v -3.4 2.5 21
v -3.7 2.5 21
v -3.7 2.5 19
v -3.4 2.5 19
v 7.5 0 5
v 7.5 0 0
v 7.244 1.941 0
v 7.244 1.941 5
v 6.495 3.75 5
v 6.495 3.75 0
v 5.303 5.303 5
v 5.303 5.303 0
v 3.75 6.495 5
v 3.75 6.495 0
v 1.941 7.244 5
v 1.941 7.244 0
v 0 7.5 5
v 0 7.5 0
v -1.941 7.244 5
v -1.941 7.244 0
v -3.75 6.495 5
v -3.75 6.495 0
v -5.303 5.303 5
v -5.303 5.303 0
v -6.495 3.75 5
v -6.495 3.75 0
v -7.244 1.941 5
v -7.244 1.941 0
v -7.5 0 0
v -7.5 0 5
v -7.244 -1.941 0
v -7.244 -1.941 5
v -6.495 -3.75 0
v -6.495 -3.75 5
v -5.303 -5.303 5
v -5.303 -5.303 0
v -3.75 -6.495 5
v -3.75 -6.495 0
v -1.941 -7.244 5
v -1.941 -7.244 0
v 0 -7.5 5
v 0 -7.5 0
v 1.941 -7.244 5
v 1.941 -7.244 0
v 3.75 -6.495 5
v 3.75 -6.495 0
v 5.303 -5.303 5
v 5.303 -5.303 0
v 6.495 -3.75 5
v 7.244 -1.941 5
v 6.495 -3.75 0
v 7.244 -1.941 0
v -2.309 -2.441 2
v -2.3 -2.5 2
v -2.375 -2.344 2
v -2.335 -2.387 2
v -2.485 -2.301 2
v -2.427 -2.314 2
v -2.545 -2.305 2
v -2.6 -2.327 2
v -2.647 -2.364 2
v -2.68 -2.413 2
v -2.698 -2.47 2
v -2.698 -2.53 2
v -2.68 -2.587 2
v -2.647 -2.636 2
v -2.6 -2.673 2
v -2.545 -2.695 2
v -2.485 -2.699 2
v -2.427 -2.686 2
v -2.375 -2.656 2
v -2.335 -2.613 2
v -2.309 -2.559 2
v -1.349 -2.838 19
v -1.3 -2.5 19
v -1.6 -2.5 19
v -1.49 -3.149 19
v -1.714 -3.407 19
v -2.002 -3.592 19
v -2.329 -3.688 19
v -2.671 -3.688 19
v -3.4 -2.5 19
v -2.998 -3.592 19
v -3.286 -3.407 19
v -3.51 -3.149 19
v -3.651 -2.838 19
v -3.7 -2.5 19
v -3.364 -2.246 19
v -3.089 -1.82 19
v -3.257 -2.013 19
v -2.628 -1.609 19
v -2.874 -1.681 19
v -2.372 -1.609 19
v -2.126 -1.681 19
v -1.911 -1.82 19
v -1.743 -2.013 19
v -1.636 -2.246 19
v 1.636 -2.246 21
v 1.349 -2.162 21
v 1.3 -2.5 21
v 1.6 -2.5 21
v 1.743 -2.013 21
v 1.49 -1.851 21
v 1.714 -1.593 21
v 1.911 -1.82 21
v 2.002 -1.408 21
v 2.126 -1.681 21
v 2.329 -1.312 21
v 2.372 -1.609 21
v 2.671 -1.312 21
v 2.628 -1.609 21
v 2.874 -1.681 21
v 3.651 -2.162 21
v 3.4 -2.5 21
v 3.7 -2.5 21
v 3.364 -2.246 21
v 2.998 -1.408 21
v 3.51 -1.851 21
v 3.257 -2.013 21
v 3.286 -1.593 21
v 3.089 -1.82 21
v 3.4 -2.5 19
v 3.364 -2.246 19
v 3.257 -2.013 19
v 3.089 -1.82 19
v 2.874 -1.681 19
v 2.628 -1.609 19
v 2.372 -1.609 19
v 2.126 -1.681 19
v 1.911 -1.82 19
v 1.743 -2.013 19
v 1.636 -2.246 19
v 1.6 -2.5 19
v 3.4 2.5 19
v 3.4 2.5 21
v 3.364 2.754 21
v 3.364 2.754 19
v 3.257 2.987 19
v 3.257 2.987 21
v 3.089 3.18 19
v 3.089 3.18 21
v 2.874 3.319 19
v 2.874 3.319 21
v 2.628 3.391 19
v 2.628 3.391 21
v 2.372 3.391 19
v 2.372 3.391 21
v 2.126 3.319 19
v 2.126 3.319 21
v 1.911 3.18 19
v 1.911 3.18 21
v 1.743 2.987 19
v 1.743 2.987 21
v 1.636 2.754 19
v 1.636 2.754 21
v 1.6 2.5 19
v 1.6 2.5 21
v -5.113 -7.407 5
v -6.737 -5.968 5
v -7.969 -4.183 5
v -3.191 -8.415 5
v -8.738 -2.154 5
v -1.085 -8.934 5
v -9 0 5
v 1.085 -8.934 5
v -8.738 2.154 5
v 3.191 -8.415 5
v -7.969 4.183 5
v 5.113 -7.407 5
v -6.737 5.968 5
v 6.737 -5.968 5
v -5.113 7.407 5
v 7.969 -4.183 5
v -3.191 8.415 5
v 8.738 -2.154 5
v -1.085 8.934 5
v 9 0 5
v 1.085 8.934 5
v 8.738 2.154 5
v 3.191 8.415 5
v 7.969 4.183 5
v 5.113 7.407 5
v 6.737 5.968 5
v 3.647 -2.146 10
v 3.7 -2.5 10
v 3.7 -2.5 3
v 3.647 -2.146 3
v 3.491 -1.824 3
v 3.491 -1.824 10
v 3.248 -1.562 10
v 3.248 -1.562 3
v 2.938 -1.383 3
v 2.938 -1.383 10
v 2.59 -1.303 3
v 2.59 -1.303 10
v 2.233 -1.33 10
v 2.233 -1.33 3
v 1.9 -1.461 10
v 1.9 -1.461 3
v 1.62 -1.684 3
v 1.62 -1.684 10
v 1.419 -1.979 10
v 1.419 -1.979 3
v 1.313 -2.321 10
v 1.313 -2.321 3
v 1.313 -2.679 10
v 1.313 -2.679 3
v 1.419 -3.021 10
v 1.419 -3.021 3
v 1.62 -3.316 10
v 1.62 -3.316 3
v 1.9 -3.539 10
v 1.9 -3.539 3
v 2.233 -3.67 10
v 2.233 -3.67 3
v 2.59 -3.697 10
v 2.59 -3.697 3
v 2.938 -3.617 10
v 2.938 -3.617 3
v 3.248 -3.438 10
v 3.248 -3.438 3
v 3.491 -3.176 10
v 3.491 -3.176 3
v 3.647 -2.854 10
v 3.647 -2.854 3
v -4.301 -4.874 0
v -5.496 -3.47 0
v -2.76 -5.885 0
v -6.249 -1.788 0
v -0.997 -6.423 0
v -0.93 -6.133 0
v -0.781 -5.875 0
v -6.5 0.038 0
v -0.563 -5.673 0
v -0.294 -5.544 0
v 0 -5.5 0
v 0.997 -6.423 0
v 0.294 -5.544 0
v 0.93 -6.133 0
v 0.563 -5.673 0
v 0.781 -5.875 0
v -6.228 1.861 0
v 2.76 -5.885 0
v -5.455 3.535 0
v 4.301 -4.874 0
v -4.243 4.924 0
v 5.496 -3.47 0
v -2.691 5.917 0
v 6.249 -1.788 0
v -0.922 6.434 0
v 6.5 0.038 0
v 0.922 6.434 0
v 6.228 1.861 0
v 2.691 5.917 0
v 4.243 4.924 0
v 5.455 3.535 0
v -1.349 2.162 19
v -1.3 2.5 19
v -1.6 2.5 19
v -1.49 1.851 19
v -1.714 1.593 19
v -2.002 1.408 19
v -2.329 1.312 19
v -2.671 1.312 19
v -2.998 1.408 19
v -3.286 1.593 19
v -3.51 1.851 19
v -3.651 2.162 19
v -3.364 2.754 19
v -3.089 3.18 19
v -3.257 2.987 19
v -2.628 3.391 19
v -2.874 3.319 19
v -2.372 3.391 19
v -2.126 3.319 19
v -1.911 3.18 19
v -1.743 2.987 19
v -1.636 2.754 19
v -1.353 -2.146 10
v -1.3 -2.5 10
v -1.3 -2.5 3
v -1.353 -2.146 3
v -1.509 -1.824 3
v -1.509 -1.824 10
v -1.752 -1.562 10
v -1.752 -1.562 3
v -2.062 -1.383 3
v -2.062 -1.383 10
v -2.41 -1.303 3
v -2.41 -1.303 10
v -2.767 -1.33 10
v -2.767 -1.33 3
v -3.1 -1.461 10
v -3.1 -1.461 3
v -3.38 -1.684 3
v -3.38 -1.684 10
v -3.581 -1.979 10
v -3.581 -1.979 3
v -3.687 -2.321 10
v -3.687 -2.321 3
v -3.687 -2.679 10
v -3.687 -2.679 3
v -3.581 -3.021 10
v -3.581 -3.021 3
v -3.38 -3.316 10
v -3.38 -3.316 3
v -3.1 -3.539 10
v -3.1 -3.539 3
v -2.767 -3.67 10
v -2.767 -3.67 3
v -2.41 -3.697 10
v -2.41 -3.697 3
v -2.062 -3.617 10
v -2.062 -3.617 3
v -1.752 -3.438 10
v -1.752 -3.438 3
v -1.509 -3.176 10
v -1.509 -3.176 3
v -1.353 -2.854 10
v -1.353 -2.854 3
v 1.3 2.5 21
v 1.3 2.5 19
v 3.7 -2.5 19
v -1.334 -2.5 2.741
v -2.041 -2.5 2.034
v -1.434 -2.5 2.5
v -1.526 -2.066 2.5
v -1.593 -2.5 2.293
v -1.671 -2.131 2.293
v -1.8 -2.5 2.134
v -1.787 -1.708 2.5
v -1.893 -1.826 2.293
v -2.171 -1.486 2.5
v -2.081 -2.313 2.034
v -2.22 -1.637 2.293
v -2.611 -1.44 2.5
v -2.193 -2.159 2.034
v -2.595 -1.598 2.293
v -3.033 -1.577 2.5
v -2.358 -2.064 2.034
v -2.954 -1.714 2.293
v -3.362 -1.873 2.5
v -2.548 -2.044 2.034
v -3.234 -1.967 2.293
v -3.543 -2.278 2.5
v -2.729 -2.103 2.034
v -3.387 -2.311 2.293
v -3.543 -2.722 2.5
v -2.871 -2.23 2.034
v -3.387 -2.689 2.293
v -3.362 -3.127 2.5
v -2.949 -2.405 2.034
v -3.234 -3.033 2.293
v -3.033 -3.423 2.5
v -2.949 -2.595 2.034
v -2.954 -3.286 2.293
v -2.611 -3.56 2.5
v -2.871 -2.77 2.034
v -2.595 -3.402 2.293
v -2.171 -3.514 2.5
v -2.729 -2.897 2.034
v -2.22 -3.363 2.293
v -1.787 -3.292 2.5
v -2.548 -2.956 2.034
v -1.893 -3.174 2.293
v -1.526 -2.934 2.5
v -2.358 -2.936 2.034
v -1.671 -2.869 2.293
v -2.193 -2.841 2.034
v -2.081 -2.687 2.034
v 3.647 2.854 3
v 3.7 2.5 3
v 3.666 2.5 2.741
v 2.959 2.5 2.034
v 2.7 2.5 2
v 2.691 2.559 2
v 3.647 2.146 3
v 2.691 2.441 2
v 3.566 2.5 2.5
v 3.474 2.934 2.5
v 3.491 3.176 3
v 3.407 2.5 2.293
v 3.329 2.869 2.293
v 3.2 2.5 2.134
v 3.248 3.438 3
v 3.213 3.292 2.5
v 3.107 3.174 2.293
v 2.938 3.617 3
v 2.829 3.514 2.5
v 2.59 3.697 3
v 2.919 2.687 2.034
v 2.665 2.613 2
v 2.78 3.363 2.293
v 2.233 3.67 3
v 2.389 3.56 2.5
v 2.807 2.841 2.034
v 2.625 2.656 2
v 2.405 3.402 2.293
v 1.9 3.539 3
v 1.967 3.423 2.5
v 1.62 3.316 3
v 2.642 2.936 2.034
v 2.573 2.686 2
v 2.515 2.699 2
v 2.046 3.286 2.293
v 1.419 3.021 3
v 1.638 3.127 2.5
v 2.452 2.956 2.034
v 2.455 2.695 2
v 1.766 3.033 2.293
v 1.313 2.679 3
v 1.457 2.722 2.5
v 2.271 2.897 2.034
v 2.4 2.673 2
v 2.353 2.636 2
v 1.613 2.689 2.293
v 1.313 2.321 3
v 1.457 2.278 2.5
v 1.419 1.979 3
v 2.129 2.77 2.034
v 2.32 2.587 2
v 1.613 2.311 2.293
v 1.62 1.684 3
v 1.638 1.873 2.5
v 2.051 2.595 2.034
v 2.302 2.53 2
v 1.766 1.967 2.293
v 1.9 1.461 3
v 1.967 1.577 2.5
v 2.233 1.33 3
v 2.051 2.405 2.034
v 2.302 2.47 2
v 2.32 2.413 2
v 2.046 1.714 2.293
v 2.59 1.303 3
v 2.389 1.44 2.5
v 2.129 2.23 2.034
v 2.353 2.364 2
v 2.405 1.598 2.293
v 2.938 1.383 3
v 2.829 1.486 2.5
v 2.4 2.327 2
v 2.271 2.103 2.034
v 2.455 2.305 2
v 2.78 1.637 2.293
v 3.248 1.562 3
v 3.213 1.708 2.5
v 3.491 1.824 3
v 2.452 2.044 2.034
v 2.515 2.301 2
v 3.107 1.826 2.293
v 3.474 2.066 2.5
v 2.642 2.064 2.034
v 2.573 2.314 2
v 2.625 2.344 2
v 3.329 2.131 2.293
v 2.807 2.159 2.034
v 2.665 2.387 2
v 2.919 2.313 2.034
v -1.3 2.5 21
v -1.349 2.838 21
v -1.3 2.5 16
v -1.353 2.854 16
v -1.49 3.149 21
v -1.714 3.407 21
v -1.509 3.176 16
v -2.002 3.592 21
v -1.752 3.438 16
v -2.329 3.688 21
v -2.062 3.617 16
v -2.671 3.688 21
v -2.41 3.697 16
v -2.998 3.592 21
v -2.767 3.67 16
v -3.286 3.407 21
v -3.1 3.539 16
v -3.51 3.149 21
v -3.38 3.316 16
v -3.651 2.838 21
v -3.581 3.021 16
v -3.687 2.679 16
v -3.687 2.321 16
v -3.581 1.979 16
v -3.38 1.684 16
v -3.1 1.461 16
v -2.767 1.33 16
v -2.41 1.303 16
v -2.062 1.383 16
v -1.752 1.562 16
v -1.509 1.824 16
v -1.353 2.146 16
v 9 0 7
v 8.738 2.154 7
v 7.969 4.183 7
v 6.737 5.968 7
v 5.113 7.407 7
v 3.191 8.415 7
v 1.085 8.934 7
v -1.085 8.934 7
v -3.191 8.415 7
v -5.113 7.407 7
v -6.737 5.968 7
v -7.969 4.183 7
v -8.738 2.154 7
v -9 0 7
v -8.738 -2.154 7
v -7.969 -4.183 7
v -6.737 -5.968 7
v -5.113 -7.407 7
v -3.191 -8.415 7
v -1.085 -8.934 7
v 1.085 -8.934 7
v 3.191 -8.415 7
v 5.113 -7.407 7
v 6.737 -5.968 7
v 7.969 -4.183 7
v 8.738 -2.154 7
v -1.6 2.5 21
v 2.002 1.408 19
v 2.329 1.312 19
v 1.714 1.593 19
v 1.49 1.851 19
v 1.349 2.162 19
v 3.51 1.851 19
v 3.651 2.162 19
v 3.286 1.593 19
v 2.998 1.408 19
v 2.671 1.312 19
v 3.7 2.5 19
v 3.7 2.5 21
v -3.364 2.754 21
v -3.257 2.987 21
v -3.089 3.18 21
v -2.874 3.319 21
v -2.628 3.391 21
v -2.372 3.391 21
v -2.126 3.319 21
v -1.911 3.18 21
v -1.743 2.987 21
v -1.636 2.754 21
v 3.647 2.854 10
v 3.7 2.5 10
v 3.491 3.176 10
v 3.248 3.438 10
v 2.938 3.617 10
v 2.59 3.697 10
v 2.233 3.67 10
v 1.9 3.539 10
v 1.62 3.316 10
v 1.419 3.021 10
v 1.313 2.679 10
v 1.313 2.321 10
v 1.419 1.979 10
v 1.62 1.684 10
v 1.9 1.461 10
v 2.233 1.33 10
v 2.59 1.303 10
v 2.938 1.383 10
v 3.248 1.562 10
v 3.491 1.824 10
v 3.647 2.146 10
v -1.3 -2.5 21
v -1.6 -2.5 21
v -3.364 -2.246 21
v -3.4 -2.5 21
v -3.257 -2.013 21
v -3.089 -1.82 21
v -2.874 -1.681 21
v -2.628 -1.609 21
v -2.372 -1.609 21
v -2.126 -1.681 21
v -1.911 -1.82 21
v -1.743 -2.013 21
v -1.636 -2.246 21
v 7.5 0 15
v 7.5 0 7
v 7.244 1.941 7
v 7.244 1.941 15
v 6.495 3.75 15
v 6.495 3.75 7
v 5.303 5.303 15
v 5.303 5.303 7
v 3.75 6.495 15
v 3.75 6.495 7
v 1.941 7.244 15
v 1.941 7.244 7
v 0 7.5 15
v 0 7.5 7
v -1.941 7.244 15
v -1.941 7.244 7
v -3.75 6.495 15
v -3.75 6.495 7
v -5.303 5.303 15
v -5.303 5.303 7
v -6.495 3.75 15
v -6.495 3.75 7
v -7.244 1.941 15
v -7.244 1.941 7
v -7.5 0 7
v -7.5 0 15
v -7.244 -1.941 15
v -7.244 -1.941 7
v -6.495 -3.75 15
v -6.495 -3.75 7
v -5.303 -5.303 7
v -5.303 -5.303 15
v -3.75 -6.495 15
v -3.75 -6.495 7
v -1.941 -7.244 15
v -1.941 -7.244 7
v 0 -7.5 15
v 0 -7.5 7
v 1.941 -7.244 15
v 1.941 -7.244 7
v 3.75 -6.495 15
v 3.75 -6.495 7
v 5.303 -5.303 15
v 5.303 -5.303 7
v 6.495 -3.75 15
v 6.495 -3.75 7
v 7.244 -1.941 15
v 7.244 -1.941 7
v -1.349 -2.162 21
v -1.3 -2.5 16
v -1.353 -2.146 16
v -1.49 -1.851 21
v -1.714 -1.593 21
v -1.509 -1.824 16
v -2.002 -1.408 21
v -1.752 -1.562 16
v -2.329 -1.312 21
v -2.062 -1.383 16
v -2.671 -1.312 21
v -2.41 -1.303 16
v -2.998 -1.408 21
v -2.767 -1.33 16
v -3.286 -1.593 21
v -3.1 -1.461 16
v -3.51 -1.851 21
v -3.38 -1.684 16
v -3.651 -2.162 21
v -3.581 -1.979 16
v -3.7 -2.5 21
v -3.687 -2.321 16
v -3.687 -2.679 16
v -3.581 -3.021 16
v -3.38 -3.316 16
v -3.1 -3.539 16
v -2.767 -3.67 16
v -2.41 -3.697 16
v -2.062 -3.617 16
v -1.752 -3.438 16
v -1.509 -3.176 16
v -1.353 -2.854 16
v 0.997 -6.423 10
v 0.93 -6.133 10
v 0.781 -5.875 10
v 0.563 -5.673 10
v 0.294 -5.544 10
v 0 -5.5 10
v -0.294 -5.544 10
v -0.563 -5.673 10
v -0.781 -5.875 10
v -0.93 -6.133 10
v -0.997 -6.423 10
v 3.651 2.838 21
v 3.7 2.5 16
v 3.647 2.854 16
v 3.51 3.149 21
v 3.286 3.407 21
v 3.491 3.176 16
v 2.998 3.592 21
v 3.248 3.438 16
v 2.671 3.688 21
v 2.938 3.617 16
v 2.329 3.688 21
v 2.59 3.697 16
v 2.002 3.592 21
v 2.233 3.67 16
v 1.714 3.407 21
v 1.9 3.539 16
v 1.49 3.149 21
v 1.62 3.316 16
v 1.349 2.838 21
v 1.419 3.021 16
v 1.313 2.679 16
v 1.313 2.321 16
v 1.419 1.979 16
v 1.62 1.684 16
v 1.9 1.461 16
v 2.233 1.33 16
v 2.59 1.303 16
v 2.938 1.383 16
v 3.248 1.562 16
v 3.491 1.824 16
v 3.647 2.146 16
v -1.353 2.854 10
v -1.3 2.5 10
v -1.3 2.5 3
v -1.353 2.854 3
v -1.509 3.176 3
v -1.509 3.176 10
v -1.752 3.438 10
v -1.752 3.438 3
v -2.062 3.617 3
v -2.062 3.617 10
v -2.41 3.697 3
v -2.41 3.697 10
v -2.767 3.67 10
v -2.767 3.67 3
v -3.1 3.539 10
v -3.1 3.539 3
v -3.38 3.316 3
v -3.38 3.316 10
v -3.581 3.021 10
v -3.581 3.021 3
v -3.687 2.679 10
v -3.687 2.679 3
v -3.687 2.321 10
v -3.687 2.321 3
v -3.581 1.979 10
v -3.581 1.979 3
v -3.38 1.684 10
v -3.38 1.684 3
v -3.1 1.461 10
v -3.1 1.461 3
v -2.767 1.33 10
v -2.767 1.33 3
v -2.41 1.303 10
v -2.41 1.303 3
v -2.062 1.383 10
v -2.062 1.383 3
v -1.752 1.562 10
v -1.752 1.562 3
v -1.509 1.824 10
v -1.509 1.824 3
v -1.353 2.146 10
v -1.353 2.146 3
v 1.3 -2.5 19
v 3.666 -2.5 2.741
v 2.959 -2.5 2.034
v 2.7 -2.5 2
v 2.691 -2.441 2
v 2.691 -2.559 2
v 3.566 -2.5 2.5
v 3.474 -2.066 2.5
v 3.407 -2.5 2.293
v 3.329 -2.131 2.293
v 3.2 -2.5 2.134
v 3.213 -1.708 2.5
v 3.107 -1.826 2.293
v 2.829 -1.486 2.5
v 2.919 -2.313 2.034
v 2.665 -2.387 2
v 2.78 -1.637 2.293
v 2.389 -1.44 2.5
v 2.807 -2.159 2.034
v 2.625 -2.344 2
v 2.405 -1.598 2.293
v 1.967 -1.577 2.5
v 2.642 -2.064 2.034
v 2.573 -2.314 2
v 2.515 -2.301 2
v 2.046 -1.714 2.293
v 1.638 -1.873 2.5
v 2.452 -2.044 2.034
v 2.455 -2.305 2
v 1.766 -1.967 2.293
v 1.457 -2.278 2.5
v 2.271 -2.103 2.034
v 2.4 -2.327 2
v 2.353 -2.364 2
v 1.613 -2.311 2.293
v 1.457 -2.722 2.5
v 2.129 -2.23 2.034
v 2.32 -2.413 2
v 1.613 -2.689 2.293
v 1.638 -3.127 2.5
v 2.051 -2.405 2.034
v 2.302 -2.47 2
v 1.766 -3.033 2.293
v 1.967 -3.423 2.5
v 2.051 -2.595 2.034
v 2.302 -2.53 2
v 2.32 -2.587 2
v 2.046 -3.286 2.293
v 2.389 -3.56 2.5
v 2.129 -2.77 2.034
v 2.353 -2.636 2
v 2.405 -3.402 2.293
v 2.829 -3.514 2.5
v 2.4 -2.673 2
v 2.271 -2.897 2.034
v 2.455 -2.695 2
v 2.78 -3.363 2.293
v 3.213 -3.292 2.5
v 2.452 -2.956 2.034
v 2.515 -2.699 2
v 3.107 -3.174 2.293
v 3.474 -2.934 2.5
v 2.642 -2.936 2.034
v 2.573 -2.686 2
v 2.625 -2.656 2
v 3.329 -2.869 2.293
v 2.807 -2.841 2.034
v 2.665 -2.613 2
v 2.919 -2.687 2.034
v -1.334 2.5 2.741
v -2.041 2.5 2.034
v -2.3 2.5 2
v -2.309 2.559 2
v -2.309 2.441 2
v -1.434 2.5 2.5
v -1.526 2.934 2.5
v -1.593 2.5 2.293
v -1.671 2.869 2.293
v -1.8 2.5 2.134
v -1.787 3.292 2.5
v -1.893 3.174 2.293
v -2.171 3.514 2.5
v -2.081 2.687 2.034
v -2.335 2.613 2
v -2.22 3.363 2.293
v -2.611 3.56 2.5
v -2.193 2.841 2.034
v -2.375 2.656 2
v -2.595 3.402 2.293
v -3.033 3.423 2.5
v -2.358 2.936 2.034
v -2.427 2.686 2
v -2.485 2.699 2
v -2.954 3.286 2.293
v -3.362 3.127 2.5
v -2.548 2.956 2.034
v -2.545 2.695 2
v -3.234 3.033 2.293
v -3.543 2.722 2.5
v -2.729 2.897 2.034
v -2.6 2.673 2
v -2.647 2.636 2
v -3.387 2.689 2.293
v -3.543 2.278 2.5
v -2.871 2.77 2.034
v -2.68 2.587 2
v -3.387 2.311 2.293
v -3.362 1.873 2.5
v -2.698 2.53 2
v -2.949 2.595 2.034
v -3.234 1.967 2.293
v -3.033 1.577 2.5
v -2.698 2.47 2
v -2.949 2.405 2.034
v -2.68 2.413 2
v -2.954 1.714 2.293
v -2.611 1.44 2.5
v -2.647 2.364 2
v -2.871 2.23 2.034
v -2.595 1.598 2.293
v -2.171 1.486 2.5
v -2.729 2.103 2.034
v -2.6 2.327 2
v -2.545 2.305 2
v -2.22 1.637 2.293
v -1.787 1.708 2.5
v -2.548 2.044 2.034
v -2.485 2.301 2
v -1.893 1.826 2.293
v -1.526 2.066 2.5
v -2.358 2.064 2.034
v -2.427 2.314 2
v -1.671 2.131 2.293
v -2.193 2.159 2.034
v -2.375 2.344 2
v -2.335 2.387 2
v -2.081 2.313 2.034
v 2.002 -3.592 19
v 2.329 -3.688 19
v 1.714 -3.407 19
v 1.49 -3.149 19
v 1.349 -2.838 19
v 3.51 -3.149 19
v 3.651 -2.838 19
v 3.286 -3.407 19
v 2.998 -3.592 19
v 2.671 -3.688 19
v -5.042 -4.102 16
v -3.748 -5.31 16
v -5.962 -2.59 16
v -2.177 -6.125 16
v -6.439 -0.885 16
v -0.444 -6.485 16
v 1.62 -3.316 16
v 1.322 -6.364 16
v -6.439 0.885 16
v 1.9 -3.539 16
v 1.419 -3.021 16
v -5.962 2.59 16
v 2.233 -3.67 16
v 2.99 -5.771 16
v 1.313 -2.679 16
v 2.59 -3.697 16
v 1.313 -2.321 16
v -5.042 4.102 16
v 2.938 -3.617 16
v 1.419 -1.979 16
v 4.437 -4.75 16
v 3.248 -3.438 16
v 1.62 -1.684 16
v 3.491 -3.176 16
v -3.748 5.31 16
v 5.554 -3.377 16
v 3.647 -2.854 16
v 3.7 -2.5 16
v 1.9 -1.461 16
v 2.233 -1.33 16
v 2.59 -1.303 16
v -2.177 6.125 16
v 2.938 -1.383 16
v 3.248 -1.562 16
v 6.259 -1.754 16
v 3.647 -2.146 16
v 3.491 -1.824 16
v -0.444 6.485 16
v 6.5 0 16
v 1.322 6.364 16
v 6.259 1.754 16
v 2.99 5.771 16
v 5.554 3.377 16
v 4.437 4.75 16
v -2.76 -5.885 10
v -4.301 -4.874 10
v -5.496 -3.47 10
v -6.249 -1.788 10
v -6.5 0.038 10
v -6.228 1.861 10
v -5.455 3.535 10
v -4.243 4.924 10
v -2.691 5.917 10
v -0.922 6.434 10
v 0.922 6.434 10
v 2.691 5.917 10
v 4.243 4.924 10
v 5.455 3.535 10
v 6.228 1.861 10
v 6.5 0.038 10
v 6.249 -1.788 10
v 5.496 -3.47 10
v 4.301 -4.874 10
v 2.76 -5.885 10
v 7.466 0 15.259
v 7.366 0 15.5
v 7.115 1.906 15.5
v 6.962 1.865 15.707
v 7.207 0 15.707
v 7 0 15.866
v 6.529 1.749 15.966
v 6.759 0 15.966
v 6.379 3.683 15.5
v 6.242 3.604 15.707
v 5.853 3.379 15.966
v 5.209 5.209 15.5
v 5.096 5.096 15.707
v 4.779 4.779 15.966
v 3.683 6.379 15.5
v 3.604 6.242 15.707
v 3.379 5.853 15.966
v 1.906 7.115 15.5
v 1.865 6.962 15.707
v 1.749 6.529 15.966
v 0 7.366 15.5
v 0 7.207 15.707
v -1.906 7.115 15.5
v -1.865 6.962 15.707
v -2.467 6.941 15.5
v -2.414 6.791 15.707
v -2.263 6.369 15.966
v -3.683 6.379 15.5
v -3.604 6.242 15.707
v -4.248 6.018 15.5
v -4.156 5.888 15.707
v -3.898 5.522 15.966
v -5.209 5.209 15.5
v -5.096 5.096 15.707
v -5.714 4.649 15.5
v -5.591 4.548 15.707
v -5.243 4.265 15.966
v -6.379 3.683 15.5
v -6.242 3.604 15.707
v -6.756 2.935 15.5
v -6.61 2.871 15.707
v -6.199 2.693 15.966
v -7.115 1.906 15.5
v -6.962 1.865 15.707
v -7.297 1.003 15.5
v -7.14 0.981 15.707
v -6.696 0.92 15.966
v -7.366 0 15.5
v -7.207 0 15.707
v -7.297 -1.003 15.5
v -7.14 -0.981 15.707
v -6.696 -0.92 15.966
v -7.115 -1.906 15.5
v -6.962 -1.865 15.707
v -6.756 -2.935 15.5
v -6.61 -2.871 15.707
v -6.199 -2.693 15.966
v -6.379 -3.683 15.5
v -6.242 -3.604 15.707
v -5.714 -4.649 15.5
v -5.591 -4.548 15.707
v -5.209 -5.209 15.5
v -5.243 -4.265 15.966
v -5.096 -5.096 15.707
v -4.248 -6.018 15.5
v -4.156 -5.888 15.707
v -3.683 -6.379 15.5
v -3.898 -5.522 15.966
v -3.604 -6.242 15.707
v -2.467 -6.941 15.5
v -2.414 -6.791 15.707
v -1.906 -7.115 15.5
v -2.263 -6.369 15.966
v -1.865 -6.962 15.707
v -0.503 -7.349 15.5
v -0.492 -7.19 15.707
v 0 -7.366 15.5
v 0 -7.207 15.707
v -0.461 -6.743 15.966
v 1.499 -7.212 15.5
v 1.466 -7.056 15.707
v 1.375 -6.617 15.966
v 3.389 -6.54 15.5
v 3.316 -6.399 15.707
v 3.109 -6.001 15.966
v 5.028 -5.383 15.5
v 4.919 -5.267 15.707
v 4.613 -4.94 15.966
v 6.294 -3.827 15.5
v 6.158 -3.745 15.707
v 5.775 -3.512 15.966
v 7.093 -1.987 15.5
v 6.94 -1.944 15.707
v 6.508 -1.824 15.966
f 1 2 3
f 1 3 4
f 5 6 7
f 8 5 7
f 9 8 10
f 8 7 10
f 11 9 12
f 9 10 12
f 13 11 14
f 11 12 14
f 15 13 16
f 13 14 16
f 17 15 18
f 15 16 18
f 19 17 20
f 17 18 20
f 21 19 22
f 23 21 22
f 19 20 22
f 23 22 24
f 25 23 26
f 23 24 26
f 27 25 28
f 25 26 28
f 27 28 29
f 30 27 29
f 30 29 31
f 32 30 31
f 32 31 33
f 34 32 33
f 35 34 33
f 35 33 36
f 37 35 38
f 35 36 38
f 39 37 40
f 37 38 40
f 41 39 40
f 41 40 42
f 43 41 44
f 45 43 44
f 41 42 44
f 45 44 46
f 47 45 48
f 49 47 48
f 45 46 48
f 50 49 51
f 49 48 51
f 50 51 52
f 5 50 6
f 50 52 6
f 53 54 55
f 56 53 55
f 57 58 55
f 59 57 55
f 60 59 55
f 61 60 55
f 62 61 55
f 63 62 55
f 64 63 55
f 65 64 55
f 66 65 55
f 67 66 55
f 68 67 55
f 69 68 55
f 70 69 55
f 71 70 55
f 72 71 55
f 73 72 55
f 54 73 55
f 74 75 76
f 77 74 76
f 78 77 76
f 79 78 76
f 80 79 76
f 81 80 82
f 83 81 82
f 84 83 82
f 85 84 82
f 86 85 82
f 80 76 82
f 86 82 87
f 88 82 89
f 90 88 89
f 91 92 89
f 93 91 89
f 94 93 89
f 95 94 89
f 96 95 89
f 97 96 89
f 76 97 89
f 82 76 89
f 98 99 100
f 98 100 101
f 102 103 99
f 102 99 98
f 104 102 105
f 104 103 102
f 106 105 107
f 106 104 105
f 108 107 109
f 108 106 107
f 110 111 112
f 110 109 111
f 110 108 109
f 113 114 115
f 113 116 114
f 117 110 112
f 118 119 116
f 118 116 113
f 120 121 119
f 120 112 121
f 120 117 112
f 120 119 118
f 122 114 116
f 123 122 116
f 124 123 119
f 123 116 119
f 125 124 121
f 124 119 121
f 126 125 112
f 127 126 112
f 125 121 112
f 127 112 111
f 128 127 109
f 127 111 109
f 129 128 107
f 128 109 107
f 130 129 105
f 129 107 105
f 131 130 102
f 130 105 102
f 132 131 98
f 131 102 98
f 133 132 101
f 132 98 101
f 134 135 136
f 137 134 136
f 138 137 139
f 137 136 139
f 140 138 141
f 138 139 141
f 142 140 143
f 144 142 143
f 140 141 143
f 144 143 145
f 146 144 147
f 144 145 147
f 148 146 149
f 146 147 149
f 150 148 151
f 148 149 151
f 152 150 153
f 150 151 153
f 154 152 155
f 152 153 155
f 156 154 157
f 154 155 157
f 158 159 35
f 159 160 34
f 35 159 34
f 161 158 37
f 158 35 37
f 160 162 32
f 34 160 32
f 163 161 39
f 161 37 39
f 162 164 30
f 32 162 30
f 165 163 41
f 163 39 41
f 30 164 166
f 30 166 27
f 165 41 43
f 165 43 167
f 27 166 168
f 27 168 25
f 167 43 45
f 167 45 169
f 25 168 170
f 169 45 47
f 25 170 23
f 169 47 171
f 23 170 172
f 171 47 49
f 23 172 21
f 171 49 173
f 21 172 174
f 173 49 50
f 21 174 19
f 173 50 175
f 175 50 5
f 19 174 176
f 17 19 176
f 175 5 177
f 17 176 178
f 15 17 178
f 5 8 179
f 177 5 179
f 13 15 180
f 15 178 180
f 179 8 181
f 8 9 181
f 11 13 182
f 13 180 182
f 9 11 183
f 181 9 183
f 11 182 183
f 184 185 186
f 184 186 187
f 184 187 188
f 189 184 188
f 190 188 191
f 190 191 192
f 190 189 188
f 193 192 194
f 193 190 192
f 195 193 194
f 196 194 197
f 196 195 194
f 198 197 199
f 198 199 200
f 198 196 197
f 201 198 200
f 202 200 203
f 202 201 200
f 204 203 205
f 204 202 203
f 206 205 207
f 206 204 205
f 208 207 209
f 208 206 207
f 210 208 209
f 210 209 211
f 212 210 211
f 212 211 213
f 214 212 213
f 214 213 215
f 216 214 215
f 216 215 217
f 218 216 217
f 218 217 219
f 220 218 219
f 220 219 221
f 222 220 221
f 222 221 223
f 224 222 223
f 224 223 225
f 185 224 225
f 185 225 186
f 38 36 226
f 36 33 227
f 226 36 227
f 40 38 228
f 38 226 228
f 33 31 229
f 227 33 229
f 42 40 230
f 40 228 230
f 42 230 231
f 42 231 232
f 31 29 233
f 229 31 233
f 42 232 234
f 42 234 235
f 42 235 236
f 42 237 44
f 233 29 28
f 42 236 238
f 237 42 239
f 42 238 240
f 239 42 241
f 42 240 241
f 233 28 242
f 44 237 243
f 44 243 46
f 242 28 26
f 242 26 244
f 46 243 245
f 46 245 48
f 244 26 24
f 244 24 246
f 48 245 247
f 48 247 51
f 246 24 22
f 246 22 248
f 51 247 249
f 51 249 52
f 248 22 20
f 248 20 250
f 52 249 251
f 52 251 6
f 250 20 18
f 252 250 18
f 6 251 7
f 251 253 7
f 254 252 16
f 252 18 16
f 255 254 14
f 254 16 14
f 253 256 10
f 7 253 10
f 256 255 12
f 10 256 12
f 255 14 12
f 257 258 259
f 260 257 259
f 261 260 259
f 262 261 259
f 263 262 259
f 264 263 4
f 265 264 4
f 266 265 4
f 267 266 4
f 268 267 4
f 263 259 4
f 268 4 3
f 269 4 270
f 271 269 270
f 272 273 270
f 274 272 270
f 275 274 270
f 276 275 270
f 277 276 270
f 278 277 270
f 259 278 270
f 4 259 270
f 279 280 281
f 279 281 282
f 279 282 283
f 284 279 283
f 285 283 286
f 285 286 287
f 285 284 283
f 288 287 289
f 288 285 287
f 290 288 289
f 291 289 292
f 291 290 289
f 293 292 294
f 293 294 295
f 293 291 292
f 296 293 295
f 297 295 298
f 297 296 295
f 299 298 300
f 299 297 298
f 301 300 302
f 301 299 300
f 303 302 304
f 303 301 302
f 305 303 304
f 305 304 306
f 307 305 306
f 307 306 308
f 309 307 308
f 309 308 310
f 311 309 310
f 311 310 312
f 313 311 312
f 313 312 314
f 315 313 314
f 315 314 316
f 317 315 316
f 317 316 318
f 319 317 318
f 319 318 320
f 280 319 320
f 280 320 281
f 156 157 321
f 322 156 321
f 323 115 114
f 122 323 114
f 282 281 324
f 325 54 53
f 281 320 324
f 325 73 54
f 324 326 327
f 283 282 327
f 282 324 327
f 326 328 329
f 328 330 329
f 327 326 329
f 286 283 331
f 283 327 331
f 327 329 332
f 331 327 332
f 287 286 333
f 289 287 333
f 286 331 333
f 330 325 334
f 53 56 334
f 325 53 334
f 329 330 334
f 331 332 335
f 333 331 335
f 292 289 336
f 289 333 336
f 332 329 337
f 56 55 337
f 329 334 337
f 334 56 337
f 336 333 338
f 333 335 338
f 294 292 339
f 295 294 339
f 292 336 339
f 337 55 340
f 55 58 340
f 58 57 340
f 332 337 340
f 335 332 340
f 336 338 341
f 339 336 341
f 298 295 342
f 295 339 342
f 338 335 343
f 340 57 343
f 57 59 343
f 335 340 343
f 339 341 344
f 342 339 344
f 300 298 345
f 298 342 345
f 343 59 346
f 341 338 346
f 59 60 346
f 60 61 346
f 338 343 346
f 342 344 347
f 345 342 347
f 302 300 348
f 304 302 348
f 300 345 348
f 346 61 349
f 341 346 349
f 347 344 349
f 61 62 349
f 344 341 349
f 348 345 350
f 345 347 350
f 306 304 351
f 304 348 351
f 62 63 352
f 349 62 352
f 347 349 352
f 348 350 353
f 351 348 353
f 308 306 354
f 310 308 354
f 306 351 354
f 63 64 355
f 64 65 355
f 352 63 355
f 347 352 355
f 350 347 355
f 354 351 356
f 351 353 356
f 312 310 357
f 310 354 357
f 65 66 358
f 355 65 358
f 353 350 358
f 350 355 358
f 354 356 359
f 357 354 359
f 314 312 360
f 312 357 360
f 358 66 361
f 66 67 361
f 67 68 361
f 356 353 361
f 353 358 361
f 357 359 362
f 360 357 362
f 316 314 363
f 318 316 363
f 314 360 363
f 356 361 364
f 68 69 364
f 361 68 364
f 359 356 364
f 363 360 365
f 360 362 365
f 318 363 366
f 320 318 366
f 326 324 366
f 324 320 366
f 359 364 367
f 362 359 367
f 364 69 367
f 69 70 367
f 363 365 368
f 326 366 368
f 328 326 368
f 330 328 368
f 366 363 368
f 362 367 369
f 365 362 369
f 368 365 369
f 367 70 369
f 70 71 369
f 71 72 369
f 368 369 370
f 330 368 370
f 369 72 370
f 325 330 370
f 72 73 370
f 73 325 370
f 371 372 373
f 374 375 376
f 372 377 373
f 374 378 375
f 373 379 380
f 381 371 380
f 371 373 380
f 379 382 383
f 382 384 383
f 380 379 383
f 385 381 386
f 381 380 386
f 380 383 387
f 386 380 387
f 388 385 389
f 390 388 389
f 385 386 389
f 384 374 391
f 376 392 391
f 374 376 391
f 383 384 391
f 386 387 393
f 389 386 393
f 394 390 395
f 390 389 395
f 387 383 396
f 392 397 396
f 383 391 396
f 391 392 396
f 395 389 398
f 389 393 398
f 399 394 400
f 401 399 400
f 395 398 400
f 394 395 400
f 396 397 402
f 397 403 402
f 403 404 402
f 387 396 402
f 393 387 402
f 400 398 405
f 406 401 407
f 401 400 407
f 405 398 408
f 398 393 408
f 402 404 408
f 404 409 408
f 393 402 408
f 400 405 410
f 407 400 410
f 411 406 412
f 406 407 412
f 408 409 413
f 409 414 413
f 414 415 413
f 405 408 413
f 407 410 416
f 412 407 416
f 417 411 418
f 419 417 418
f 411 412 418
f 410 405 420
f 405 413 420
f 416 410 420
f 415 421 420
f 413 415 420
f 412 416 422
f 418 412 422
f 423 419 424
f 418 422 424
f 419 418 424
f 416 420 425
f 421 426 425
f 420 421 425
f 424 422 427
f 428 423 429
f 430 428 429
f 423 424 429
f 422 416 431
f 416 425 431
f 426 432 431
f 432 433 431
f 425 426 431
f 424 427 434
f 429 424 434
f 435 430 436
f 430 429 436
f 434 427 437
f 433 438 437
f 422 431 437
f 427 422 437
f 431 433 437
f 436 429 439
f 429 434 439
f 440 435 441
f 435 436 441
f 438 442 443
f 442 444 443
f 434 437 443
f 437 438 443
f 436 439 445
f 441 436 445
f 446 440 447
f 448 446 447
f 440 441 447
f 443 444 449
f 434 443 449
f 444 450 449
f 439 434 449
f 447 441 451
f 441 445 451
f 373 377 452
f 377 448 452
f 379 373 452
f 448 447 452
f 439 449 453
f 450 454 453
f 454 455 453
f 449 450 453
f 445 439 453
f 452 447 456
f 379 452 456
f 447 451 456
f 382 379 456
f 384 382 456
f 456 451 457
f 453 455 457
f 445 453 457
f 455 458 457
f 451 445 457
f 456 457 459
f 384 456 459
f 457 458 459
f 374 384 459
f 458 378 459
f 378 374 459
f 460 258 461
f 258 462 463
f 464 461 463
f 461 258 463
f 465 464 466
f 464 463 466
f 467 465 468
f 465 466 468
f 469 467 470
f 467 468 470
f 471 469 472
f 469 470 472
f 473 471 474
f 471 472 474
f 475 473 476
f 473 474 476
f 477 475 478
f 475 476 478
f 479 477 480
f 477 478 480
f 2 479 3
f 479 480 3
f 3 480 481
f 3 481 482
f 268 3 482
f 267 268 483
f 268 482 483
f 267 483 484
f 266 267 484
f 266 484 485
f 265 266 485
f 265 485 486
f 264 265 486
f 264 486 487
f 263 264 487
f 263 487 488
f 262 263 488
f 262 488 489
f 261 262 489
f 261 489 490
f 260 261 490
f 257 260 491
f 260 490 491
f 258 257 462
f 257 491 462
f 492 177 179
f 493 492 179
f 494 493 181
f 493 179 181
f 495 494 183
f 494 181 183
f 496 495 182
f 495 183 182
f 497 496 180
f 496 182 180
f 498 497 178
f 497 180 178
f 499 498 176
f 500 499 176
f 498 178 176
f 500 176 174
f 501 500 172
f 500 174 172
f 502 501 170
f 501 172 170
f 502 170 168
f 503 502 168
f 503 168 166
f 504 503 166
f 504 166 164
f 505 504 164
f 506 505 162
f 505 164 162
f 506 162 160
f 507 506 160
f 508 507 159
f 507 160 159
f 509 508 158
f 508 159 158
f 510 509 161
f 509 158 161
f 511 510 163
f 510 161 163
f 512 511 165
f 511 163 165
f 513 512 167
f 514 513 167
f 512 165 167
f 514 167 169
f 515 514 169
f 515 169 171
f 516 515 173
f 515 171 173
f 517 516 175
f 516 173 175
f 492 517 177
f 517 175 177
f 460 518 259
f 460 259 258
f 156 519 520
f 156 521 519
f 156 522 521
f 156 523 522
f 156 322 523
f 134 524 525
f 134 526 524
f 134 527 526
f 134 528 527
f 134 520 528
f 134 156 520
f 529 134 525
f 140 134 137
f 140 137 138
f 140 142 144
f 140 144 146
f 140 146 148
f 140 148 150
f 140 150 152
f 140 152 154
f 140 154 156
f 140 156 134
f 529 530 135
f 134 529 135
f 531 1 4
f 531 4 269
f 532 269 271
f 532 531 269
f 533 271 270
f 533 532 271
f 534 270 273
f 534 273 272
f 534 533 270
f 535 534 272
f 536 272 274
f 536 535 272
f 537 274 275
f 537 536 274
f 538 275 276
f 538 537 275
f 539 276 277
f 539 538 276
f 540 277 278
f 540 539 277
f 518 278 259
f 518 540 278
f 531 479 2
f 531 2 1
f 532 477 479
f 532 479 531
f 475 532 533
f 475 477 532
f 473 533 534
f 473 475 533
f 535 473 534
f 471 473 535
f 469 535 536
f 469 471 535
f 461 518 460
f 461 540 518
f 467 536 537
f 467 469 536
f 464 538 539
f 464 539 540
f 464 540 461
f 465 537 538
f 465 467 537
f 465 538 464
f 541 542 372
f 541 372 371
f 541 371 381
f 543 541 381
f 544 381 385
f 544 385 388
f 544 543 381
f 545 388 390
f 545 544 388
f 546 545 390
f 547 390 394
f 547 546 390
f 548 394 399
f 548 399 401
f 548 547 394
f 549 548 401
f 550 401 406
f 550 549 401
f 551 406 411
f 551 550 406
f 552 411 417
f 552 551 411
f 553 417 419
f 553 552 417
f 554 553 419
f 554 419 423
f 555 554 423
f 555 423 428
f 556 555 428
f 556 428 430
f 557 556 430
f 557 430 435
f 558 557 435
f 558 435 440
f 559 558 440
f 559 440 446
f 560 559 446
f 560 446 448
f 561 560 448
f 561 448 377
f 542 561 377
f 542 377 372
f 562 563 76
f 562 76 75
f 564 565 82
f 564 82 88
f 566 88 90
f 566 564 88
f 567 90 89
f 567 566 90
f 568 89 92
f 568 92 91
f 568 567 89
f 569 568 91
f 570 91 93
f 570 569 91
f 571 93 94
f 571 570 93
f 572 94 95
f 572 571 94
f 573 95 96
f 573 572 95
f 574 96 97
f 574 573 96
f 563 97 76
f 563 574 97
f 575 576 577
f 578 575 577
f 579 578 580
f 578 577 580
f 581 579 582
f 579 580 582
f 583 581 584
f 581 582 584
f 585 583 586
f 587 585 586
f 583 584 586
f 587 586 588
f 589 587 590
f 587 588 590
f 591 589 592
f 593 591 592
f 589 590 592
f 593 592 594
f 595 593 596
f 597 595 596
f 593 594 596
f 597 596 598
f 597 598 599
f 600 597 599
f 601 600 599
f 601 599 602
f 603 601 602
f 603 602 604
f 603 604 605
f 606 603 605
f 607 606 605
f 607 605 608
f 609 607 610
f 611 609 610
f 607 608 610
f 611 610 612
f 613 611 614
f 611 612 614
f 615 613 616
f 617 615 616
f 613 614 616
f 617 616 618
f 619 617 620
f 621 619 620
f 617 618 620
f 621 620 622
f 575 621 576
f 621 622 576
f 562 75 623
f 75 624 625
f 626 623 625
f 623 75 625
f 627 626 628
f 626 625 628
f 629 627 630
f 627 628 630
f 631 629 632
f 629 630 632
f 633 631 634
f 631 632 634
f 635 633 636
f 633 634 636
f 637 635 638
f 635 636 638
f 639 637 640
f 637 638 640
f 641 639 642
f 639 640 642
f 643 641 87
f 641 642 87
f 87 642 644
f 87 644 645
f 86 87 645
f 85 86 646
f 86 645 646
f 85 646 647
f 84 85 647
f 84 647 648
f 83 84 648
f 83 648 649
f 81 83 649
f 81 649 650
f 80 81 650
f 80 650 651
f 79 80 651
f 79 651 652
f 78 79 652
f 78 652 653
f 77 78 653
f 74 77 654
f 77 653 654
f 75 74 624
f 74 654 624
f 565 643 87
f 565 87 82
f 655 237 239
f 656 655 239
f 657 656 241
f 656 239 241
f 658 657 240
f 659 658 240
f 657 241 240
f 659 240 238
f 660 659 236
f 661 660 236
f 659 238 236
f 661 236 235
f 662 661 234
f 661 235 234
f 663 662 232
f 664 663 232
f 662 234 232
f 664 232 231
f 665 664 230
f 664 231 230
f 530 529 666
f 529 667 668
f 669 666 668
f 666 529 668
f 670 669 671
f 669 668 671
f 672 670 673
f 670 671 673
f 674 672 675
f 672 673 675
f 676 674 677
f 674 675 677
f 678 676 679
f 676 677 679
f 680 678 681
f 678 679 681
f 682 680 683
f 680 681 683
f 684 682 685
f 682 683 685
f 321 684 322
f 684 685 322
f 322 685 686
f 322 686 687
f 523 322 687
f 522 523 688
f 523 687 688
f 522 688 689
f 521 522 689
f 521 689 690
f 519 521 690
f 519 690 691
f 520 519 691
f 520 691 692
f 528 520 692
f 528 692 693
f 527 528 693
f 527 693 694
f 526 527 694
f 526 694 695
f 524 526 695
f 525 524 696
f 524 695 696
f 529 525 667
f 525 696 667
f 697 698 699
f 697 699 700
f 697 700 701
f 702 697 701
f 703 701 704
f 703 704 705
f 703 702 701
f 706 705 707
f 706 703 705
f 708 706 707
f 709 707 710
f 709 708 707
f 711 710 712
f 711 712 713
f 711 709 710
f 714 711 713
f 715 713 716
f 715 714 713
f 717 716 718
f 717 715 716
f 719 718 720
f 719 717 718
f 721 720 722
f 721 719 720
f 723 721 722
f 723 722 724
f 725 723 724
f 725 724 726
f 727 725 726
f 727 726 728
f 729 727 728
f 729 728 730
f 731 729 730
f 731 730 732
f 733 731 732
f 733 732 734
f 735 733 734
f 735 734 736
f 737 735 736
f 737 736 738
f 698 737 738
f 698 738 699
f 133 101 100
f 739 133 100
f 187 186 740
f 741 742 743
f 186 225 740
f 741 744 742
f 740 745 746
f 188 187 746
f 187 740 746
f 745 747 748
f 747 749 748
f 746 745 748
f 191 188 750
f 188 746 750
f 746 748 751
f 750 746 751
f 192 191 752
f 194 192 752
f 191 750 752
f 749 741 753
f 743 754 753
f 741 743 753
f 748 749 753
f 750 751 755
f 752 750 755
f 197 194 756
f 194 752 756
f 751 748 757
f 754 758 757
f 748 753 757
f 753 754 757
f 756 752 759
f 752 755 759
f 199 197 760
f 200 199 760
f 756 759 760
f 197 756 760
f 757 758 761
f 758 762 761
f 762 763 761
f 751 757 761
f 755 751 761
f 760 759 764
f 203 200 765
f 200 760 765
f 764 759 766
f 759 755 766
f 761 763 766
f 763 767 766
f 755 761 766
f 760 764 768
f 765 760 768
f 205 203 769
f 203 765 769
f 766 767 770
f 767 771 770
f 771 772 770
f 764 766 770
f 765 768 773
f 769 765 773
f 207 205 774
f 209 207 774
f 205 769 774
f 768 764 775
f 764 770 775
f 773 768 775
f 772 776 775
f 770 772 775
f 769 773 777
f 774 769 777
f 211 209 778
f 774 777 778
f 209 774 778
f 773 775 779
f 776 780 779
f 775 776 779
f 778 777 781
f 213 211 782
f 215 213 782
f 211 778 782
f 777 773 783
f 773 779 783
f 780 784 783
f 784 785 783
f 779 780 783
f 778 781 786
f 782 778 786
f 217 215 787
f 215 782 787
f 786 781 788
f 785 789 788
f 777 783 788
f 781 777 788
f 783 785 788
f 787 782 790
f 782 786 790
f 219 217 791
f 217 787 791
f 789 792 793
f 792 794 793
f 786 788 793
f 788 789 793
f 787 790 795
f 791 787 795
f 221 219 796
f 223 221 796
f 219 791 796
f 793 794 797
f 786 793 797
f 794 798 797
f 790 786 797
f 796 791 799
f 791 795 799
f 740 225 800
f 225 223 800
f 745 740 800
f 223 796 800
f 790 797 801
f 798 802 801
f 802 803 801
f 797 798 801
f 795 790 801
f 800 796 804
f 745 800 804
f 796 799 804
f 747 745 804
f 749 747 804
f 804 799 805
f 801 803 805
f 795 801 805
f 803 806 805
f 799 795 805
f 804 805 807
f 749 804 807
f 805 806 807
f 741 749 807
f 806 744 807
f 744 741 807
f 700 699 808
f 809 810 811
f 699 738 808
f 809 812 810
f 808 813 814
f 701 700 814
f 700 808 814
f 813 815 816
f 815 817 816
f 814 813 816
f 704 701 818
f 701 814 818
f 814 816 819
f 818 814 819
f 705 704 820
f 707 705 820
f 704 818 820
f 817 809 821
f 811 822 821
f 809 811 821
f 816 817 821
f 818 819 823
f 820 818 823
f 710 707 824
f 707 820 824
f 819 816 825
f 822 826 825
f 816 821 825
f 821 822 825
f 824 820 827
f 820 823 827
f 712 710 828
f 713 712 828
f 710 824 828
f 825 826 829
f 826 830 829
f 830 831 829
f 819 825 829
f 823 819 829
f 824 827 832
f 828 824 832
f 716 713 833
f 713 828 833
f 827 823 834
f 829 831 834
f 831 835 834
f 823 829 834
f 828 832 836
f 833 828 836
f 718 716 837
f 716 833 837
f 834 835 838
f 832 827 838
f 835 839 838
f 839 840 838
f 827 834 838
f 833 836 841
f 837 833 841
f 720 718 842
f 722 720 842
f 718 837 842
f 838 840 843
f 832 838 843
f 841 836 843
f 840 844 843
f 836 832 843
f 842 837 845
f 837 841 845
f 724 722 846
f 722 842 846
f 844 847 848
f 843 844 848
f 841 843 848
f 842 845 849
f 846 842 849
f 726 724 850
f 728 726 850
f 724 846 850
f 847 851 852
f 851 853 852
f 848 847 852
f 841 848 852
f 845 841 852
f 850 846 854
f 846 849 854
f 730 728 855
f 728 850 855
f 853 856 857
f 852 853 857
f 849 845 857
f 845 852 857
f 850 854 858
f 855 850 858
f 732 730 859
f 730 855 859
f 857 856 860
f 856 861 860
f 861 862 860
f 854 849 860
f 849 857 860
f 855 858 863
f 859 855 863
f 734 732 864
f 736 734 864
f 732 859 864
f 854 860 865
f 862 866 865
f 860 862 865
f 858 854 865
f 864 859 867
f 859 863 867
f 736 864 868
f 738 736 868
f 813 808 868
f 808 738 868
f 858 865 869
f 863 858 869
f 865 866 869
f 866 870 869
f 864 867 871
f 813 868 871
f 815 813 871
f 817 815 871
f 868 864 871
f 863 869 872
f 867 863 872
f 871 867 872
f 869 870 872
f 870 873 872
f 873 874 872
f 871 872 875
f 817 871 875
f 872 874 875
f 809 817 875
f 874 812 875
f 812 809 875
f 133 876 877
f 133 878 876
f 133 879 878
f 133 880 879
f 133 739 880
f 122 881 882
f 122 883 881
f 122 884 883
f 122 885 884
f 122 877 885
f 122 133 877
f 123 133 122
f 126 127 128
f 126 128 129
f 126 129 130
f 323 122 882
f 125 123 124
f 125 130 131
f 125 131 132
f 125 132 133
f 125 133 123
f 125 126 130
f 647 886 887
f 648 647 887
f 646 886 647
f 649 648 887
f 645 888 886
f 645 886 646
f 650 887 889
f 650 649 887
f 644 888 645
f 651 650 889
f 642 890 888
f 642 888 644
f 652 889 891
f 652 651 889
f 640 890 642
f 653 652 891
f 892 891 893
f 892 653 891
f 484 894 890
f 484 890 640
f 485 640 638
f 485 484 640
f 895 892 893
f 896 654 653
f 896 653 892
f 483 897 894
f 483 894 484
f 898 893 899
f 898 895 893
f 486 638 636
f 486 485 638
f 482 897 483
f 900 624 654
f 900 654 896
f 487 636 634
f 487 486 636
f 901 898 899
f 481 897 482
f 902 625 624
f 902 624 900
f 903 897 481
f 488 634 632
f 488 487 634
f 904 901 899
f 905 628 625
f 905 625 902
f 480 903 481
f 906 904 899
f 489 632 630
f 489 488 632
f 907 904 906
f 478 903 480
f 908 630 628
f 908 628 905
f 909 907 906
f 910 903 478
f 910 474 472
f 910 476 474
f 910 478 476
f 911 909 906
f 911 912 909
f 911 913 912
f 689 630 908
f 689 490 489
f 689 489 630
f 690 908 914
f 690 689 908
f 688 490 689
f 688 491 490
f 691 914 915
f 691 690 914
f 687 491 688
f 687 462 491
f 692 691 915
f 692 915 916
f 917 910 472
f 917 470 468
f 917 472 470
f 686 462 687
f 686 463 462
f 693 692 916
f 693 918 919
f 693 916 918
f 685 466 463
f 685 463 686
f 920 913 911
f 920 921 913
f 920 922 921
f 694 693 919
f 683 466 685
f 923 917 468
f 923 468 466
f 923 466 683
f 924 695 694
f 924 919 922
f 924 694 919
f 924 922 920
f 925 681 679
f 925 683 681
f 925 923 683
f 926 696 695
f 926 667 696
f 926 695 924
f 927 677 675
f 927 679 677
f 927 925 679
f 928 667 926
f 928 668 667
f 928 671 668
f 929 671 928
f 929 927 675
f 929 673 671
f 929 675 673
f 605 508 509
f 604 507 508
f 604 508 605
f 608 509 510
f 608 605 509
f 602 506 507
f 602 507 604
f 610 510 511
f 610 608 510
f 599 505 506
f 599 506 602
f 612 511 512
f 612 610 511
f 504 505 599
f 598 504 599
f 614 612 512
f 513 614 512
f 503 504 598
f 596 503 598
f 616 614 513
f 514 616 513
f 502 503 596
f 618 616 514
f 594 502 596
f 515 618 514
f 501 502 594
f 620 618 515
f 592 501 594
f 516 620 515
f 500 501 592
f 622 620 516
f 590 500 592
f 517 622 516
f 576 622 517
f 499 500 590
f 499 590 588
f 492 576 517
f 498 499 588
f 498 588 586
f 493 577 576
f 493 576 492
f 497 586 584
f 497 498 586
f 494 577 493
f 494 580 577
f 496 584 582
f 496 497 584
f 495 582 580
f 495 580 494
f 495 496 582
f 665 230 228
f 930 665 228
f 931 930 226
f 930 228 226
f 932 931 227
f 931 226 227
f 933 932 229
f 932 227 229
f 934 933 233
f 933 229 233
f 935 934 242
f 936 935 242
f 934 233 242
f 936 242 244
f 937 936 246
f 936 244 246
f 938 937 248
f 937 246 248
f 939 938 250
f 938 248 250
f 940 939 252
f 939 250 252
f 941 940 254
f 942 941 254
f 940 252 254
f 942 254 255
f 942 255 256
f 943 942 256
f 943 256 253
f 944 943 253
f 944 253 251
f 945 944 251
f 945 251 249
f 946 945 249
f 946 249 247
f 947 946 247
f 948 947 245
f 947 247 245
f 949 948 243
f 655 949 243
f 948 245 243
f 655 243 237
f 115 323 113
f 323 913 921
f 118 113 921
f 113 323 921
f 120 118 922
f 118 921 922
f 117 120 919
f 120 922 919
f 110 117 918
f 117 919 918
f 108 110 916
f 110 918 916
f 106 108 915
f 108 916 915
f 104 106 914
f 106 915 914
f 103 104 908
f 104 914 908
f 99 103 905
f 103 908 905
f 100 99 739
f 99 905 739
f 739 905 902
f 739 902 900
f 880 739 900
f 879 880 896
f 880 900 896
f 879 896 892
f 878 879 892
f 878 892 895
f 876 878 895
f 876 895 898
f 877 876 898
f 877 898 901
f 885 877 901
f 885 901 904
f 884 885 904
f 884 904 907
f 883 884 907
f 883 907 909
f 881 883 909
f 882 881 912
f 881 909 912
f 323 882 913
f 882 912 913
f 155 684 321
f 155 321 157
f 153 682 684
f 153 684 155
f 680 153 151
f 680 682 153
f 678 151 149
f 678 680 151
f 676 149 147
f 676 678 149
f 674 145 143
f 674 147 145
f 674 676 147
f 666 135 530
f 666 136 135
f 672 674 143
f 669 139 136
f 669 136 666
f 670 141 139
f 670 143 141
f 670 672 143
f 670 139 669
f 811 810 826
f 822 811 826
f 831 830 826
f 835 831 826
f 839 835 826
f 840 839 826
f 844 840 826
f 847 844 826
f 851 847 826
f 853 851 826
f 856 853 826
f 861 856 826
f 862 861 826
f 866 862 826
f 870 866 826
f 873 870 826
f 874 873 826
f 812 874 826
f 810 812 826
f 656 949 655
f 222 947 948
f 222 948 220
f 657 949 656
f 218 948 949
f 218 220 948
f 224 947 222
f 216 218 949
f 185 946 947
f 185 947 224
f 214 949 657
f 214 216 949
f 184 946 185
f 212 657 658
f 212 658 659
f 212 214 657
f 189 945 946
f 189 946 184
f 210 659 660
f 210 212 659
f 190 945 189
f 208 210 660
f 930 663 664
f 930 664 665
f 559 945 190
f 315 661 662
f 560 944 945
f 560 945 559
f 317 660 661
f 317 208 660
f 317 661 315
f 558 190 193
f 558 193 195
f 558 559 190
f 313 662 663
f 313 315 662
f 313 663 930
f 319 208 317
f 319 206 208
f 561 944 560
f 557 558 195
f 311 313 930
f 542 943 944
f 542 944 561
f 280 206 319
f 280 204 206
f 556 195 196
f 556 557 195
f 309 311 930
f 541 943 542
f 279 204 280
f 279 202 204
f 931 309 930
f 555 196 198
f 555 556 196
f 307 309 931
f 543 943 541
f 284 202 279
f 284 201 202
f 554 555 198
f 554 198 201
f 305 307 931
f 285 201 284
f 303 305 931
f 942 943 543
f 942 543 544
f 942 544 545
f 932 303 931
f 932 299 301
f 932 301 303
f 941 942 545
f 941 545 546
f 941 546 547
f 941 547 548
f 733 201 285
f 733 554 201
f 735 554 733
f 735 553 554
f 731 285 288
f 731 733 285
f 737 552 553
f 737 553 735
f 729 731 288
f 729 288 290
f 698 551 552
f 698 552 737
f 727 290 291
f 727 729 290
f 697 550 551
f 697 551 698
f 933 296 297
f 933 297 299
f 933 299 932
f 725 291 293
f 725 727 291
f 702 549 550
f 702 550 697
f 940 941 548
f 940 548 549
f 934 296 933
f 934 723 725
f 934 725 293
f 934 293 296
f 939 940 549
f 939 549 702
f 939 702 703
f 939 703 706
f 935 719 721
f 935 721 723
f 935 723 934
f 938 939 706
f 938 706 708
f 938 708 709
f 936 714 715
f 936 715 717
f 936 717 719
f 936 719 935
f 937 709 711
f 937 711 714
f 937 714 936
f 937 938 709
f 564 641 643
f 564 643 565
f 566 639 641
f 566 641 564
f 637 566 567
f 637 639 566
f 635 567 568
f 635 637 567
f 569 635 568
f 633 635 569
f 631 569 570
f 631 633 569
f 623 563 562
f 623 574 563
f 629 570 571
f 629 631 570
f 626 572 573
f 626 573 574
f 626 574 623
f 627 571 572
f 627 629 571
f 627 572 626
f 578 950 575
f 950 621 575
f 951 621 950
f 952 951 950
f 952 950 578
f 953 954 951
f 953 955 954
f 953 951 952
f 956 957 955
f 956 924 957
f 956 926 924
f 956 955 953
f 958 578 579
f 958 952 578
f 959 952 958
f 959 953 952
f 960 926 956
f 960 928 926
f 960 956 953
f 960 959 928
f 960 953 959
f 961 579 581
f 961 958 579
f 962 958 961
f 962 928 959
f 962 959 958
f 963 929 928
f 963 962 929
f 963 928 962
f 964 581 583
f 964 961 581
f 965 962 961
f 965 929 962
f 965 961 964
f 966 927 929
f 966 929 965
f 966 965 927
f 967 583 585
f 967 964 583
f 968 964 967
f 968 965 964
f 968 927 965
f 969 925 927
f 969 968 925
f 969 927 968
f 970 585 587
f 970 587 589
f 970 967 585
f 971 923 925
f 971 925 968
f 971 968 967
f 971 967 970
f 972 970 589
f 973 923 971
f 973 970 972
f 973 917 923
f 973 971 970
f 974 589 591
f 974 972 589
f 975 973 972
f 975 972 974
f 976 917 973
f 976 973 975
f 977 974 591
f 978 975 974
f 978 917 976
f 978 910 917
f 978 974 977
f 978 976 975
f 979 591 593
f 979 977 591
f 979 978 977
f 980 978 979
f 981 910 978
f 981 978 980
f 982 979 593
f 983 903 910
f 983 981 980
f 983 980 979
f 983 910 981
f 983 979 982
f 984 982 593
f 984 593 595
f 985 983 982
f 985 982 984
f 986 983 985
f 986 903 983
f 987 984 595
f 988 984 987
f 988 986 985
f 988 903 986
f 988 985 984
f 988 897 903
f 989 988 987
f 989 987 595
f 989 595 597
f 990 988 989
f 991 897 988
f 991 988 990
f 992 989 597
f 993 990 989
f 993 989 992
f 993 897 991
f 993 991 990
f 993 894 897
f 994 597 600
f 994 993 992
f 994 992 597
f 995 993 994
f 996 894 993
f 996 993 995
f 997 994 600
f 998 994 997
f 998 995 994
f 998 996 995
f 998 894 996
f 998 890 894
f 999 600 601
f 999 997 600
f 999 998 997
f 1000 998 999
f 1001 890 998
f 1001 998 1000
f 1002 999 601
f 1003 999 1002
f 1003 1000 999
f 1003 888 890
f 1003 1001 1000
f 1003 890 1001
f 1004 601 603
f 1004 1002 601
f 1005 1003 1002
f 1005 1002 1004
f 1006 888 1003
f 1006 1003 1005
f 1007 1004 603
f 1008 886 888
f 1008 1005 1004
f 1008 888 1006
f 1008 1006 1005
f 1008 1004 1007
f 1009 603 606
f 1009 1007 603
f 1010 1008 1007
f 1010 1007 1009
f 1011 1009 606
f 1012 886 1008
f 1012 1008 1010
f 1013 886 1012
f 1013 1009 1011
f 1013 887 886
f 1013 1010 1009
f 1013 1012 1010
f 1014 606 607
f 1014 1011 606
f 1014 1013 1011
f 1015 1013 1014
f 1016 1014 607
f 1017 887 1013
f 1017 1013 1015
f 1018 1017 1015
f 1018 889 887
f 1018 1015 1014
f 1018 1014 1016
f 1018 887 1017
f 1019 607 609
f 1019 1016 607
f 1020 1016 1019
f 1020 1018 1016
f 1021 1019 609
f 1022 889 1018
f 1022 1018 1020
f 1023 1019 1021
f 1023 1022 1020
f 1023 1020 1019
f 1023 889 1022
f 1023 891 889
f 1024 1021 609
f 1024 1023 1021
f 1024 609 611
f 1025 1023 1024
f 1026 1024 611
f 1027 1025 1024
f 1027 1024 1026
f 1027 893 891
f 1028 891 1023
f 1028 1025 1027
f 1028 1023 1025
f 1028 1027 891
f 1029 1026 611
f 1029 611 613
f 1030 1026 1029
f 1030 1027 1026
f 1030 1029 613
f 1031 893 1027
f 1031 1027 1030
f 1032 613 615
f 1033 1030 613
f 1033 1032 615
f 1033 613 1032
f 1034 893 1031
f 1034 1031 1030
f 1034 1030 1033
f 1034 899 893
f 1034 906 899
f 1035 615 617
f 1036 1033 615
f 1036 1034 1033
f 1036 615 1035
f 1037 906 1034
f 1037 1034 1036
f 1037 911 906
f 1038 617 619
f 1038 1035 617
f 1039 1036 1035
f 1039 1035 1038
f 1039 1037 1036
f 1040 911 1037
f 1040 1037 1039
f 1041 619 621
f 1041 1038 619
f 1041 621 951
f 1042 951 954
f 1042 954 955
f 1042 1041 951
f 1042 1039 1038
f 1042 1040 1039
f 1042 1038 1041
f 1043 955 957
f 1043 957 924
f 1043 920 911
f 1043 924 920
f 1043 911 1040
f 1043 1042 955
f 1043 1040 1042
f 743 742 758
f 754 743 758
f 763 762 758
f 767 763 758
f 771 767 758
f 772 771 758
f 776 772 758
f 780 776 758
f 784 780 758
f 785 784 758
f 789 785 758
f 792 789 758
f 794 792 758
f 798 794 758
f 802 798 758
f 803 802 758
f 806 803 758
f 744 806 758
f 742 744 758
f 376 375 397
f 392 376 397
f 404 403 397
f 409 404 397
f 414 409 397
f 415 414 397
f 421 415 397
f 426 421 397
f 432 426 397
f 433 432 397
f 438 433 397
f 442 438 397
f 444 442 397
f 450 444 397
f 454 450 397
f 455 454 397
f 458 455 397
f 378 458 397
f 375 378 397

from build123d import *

# Parameters (mm, degrees)
SKETCH_1_R           = 7.5
EXTRUDE_1_DEPTH      = 5
SKETCH_2_R           = 9
EXTRUDE_2_DEPTH      = 2
SKETCH_3_R           = 7.5
EXTRUDE_3_DEPTH      = 9
CUT_EXTRUDE_1_DEPTH  = 10
EXTRUDE_4_DEPTH      = 5
EXTRUDE_4_DEPTH_BACK = 14
SKETCH_4_R           = 1.2
CUT_EXTRUDE_2_DEPTH  = 2
FILLET_1_R           = 1
FILLET_2_R           = 1


with BuildPart() as part:
    # Эскиз1 → Бобышка-Вытянуть1 (new body)
    with BuildSketch(Plane.XY):
        Circle(SKETCH_1_R)
    extrude(amount=EXTRUDE_1_DEPTH)

    # Эскиз2 → Бобышка-Вытянуть2 (add)
    with BuildSketch(Plane.XY.offset(5)):
        Circle(SKETCH_2_R)
    extrude(amount=EXTRUDE_2_DEPTH)

    # Эскиз3 → Бобышка-Вытянуть3 (add)
    with BuildSketch(Plane.XY.offset(7)):
        Circle(SKETCH_3_R)
    extrude(amount=EXTRUDE_3_DEPTH)

    # Эскиз5 → Вырез-Вытянуть1 (cut)
    with BuildSketch(Plane(origin=(0, 0, 0), x_dir=(-1, 0, 0), z_dir=(0, 0, -1))):
        with BuildLine():
            ThreePointArc((0.997037031, -6.423076923), (0, 6.5), (-0.997037031, -6.423076923))
            ThreePointArc((-0.997037031, -6.423076923), (0, -5.5), (0.997037031, -6.423076923))
        make_face()
    extrude(amount=-CUT_EXTRUDE_1_DEPTH, mode=Mode.SUBTRACT)

    # Эскиз4 → Бобышка-Вытянуть4 (add, two sides: drawn at the far end of the back side and taken through both)
    with BuildSketch(Plane.XY.offset(16).offset(-EXTRUDE_4_DEPTH_BACK)):
        with Locations((-2.5, 2.5)):
            Circle(SKETCH_4_R)
        with Locations((-2.5, -2.5)):
            Circle(SKETCH_4_R)
        with Locations((2.5, -2.5)):
            Circle(SKETCH_4_R)
        with Locations((2.5, 2.5)):
            Circle(SKETCH_4_R)
    extrude(amount=EXTRUDE_4_DEPTH + EXTRUDE_4_DEPTH_BACK)

    # Эскиз6 → Вырез-Вытянуть2 (cut)
    with BuildSketch(Plane.XY.offset(21)):
        with BuildLine():
            Line((-4.065638272, 2.5), (-3.4, 2.5))
            ThreePointArc((-3.4, 2.5), (-2.5, 3.4), (-1.6, 2.5))
            Line((-1.6, 2.5), (-1.02269763, 2.5))
            Line((-1.02269763, 2.5), (-1.813265542, 1.11023828))
            Line((-1.813265542, 1.11023828), (-3.304903111, 1.11023828))
            Line((-3.304903111, 1.11023828), (-4.065638272, 2.5))
        make_face()
        with BuildLine():
            Line((1.6, 2.5), (1.02269763, 2.5))
            Line((1.02269763, 2.5), (1.813265542, 1.11023828))
            Line((1.813265542, 1.11023828), (3.304903111, 1.11023828))
            Line((3.304903111, 1.11023828), (4.065638272, 2.5))
            Line((4.065638272, 2.5), (3.4, 2.5))
            ThreePointArc((3.4, 2.5), (2.5, 3.4), (1.6, 2.5))
        make_face()
        with BuildLine():
            Line((4.065638272, -2.5), (3.4, -2.5))
            ThreePointArc((3.4, -2.5), (2.5, -1.6), (1.6, -2.5))
            Line((1.6, -2.5), (1.02269763, -2.5))
            Line((1.02269763, -2.5), (1.813265542, -3.88976172))
            Line((1.813265542, -3.88976172), (3.304903111, -3.88976172))
            Line((3.304903111, -3.88976172), (4.065638272, -2.5))
        make_face()
        with BuildLine():
            Line((-1.02269763, -2.5), (-1.813265542, -3.88976172))
            Line((-1.813265542, -3.88976172), (-3.304903111, -3.88976172))
            Line((-3.304903111, -3.88976172), (-4.065638272, -2.5))
            Line((-4.065638272, -2.5), (-3.4, -2.5))
            ThreePointArc((-3.4, -2.5), (-2.5, -1.6), (-1.6, -2.5))
            Line((-1.6, -2.5), (-1.02269763, -2.5))
        make_face()
    extrude(amount=-CUT_EXTRUDE_2_DEPTH, mode=Mode.SUBTRACT)

    # Скругление1
    fillet_1_edges = [part.edges().sort_by_distance(p)[0] for p in [
        (1.3, -2.5, 2),
        (-3.7, -2.5, 2),
        (-3.7, 2.5, 2),
        (1.3, 2.5, 2),
    ]]
    fillet(fillet_1_edges, radius=FILLET_1_R)

    # Скругление2
    fillet_2_edges = [part.edges().sort_by_distance(p)[0] for p in [
        (-7.5, 0, 16),
    ]]
    fillet(fillet_2_edges, radius=FILLET_2_R)


solid = part.part
